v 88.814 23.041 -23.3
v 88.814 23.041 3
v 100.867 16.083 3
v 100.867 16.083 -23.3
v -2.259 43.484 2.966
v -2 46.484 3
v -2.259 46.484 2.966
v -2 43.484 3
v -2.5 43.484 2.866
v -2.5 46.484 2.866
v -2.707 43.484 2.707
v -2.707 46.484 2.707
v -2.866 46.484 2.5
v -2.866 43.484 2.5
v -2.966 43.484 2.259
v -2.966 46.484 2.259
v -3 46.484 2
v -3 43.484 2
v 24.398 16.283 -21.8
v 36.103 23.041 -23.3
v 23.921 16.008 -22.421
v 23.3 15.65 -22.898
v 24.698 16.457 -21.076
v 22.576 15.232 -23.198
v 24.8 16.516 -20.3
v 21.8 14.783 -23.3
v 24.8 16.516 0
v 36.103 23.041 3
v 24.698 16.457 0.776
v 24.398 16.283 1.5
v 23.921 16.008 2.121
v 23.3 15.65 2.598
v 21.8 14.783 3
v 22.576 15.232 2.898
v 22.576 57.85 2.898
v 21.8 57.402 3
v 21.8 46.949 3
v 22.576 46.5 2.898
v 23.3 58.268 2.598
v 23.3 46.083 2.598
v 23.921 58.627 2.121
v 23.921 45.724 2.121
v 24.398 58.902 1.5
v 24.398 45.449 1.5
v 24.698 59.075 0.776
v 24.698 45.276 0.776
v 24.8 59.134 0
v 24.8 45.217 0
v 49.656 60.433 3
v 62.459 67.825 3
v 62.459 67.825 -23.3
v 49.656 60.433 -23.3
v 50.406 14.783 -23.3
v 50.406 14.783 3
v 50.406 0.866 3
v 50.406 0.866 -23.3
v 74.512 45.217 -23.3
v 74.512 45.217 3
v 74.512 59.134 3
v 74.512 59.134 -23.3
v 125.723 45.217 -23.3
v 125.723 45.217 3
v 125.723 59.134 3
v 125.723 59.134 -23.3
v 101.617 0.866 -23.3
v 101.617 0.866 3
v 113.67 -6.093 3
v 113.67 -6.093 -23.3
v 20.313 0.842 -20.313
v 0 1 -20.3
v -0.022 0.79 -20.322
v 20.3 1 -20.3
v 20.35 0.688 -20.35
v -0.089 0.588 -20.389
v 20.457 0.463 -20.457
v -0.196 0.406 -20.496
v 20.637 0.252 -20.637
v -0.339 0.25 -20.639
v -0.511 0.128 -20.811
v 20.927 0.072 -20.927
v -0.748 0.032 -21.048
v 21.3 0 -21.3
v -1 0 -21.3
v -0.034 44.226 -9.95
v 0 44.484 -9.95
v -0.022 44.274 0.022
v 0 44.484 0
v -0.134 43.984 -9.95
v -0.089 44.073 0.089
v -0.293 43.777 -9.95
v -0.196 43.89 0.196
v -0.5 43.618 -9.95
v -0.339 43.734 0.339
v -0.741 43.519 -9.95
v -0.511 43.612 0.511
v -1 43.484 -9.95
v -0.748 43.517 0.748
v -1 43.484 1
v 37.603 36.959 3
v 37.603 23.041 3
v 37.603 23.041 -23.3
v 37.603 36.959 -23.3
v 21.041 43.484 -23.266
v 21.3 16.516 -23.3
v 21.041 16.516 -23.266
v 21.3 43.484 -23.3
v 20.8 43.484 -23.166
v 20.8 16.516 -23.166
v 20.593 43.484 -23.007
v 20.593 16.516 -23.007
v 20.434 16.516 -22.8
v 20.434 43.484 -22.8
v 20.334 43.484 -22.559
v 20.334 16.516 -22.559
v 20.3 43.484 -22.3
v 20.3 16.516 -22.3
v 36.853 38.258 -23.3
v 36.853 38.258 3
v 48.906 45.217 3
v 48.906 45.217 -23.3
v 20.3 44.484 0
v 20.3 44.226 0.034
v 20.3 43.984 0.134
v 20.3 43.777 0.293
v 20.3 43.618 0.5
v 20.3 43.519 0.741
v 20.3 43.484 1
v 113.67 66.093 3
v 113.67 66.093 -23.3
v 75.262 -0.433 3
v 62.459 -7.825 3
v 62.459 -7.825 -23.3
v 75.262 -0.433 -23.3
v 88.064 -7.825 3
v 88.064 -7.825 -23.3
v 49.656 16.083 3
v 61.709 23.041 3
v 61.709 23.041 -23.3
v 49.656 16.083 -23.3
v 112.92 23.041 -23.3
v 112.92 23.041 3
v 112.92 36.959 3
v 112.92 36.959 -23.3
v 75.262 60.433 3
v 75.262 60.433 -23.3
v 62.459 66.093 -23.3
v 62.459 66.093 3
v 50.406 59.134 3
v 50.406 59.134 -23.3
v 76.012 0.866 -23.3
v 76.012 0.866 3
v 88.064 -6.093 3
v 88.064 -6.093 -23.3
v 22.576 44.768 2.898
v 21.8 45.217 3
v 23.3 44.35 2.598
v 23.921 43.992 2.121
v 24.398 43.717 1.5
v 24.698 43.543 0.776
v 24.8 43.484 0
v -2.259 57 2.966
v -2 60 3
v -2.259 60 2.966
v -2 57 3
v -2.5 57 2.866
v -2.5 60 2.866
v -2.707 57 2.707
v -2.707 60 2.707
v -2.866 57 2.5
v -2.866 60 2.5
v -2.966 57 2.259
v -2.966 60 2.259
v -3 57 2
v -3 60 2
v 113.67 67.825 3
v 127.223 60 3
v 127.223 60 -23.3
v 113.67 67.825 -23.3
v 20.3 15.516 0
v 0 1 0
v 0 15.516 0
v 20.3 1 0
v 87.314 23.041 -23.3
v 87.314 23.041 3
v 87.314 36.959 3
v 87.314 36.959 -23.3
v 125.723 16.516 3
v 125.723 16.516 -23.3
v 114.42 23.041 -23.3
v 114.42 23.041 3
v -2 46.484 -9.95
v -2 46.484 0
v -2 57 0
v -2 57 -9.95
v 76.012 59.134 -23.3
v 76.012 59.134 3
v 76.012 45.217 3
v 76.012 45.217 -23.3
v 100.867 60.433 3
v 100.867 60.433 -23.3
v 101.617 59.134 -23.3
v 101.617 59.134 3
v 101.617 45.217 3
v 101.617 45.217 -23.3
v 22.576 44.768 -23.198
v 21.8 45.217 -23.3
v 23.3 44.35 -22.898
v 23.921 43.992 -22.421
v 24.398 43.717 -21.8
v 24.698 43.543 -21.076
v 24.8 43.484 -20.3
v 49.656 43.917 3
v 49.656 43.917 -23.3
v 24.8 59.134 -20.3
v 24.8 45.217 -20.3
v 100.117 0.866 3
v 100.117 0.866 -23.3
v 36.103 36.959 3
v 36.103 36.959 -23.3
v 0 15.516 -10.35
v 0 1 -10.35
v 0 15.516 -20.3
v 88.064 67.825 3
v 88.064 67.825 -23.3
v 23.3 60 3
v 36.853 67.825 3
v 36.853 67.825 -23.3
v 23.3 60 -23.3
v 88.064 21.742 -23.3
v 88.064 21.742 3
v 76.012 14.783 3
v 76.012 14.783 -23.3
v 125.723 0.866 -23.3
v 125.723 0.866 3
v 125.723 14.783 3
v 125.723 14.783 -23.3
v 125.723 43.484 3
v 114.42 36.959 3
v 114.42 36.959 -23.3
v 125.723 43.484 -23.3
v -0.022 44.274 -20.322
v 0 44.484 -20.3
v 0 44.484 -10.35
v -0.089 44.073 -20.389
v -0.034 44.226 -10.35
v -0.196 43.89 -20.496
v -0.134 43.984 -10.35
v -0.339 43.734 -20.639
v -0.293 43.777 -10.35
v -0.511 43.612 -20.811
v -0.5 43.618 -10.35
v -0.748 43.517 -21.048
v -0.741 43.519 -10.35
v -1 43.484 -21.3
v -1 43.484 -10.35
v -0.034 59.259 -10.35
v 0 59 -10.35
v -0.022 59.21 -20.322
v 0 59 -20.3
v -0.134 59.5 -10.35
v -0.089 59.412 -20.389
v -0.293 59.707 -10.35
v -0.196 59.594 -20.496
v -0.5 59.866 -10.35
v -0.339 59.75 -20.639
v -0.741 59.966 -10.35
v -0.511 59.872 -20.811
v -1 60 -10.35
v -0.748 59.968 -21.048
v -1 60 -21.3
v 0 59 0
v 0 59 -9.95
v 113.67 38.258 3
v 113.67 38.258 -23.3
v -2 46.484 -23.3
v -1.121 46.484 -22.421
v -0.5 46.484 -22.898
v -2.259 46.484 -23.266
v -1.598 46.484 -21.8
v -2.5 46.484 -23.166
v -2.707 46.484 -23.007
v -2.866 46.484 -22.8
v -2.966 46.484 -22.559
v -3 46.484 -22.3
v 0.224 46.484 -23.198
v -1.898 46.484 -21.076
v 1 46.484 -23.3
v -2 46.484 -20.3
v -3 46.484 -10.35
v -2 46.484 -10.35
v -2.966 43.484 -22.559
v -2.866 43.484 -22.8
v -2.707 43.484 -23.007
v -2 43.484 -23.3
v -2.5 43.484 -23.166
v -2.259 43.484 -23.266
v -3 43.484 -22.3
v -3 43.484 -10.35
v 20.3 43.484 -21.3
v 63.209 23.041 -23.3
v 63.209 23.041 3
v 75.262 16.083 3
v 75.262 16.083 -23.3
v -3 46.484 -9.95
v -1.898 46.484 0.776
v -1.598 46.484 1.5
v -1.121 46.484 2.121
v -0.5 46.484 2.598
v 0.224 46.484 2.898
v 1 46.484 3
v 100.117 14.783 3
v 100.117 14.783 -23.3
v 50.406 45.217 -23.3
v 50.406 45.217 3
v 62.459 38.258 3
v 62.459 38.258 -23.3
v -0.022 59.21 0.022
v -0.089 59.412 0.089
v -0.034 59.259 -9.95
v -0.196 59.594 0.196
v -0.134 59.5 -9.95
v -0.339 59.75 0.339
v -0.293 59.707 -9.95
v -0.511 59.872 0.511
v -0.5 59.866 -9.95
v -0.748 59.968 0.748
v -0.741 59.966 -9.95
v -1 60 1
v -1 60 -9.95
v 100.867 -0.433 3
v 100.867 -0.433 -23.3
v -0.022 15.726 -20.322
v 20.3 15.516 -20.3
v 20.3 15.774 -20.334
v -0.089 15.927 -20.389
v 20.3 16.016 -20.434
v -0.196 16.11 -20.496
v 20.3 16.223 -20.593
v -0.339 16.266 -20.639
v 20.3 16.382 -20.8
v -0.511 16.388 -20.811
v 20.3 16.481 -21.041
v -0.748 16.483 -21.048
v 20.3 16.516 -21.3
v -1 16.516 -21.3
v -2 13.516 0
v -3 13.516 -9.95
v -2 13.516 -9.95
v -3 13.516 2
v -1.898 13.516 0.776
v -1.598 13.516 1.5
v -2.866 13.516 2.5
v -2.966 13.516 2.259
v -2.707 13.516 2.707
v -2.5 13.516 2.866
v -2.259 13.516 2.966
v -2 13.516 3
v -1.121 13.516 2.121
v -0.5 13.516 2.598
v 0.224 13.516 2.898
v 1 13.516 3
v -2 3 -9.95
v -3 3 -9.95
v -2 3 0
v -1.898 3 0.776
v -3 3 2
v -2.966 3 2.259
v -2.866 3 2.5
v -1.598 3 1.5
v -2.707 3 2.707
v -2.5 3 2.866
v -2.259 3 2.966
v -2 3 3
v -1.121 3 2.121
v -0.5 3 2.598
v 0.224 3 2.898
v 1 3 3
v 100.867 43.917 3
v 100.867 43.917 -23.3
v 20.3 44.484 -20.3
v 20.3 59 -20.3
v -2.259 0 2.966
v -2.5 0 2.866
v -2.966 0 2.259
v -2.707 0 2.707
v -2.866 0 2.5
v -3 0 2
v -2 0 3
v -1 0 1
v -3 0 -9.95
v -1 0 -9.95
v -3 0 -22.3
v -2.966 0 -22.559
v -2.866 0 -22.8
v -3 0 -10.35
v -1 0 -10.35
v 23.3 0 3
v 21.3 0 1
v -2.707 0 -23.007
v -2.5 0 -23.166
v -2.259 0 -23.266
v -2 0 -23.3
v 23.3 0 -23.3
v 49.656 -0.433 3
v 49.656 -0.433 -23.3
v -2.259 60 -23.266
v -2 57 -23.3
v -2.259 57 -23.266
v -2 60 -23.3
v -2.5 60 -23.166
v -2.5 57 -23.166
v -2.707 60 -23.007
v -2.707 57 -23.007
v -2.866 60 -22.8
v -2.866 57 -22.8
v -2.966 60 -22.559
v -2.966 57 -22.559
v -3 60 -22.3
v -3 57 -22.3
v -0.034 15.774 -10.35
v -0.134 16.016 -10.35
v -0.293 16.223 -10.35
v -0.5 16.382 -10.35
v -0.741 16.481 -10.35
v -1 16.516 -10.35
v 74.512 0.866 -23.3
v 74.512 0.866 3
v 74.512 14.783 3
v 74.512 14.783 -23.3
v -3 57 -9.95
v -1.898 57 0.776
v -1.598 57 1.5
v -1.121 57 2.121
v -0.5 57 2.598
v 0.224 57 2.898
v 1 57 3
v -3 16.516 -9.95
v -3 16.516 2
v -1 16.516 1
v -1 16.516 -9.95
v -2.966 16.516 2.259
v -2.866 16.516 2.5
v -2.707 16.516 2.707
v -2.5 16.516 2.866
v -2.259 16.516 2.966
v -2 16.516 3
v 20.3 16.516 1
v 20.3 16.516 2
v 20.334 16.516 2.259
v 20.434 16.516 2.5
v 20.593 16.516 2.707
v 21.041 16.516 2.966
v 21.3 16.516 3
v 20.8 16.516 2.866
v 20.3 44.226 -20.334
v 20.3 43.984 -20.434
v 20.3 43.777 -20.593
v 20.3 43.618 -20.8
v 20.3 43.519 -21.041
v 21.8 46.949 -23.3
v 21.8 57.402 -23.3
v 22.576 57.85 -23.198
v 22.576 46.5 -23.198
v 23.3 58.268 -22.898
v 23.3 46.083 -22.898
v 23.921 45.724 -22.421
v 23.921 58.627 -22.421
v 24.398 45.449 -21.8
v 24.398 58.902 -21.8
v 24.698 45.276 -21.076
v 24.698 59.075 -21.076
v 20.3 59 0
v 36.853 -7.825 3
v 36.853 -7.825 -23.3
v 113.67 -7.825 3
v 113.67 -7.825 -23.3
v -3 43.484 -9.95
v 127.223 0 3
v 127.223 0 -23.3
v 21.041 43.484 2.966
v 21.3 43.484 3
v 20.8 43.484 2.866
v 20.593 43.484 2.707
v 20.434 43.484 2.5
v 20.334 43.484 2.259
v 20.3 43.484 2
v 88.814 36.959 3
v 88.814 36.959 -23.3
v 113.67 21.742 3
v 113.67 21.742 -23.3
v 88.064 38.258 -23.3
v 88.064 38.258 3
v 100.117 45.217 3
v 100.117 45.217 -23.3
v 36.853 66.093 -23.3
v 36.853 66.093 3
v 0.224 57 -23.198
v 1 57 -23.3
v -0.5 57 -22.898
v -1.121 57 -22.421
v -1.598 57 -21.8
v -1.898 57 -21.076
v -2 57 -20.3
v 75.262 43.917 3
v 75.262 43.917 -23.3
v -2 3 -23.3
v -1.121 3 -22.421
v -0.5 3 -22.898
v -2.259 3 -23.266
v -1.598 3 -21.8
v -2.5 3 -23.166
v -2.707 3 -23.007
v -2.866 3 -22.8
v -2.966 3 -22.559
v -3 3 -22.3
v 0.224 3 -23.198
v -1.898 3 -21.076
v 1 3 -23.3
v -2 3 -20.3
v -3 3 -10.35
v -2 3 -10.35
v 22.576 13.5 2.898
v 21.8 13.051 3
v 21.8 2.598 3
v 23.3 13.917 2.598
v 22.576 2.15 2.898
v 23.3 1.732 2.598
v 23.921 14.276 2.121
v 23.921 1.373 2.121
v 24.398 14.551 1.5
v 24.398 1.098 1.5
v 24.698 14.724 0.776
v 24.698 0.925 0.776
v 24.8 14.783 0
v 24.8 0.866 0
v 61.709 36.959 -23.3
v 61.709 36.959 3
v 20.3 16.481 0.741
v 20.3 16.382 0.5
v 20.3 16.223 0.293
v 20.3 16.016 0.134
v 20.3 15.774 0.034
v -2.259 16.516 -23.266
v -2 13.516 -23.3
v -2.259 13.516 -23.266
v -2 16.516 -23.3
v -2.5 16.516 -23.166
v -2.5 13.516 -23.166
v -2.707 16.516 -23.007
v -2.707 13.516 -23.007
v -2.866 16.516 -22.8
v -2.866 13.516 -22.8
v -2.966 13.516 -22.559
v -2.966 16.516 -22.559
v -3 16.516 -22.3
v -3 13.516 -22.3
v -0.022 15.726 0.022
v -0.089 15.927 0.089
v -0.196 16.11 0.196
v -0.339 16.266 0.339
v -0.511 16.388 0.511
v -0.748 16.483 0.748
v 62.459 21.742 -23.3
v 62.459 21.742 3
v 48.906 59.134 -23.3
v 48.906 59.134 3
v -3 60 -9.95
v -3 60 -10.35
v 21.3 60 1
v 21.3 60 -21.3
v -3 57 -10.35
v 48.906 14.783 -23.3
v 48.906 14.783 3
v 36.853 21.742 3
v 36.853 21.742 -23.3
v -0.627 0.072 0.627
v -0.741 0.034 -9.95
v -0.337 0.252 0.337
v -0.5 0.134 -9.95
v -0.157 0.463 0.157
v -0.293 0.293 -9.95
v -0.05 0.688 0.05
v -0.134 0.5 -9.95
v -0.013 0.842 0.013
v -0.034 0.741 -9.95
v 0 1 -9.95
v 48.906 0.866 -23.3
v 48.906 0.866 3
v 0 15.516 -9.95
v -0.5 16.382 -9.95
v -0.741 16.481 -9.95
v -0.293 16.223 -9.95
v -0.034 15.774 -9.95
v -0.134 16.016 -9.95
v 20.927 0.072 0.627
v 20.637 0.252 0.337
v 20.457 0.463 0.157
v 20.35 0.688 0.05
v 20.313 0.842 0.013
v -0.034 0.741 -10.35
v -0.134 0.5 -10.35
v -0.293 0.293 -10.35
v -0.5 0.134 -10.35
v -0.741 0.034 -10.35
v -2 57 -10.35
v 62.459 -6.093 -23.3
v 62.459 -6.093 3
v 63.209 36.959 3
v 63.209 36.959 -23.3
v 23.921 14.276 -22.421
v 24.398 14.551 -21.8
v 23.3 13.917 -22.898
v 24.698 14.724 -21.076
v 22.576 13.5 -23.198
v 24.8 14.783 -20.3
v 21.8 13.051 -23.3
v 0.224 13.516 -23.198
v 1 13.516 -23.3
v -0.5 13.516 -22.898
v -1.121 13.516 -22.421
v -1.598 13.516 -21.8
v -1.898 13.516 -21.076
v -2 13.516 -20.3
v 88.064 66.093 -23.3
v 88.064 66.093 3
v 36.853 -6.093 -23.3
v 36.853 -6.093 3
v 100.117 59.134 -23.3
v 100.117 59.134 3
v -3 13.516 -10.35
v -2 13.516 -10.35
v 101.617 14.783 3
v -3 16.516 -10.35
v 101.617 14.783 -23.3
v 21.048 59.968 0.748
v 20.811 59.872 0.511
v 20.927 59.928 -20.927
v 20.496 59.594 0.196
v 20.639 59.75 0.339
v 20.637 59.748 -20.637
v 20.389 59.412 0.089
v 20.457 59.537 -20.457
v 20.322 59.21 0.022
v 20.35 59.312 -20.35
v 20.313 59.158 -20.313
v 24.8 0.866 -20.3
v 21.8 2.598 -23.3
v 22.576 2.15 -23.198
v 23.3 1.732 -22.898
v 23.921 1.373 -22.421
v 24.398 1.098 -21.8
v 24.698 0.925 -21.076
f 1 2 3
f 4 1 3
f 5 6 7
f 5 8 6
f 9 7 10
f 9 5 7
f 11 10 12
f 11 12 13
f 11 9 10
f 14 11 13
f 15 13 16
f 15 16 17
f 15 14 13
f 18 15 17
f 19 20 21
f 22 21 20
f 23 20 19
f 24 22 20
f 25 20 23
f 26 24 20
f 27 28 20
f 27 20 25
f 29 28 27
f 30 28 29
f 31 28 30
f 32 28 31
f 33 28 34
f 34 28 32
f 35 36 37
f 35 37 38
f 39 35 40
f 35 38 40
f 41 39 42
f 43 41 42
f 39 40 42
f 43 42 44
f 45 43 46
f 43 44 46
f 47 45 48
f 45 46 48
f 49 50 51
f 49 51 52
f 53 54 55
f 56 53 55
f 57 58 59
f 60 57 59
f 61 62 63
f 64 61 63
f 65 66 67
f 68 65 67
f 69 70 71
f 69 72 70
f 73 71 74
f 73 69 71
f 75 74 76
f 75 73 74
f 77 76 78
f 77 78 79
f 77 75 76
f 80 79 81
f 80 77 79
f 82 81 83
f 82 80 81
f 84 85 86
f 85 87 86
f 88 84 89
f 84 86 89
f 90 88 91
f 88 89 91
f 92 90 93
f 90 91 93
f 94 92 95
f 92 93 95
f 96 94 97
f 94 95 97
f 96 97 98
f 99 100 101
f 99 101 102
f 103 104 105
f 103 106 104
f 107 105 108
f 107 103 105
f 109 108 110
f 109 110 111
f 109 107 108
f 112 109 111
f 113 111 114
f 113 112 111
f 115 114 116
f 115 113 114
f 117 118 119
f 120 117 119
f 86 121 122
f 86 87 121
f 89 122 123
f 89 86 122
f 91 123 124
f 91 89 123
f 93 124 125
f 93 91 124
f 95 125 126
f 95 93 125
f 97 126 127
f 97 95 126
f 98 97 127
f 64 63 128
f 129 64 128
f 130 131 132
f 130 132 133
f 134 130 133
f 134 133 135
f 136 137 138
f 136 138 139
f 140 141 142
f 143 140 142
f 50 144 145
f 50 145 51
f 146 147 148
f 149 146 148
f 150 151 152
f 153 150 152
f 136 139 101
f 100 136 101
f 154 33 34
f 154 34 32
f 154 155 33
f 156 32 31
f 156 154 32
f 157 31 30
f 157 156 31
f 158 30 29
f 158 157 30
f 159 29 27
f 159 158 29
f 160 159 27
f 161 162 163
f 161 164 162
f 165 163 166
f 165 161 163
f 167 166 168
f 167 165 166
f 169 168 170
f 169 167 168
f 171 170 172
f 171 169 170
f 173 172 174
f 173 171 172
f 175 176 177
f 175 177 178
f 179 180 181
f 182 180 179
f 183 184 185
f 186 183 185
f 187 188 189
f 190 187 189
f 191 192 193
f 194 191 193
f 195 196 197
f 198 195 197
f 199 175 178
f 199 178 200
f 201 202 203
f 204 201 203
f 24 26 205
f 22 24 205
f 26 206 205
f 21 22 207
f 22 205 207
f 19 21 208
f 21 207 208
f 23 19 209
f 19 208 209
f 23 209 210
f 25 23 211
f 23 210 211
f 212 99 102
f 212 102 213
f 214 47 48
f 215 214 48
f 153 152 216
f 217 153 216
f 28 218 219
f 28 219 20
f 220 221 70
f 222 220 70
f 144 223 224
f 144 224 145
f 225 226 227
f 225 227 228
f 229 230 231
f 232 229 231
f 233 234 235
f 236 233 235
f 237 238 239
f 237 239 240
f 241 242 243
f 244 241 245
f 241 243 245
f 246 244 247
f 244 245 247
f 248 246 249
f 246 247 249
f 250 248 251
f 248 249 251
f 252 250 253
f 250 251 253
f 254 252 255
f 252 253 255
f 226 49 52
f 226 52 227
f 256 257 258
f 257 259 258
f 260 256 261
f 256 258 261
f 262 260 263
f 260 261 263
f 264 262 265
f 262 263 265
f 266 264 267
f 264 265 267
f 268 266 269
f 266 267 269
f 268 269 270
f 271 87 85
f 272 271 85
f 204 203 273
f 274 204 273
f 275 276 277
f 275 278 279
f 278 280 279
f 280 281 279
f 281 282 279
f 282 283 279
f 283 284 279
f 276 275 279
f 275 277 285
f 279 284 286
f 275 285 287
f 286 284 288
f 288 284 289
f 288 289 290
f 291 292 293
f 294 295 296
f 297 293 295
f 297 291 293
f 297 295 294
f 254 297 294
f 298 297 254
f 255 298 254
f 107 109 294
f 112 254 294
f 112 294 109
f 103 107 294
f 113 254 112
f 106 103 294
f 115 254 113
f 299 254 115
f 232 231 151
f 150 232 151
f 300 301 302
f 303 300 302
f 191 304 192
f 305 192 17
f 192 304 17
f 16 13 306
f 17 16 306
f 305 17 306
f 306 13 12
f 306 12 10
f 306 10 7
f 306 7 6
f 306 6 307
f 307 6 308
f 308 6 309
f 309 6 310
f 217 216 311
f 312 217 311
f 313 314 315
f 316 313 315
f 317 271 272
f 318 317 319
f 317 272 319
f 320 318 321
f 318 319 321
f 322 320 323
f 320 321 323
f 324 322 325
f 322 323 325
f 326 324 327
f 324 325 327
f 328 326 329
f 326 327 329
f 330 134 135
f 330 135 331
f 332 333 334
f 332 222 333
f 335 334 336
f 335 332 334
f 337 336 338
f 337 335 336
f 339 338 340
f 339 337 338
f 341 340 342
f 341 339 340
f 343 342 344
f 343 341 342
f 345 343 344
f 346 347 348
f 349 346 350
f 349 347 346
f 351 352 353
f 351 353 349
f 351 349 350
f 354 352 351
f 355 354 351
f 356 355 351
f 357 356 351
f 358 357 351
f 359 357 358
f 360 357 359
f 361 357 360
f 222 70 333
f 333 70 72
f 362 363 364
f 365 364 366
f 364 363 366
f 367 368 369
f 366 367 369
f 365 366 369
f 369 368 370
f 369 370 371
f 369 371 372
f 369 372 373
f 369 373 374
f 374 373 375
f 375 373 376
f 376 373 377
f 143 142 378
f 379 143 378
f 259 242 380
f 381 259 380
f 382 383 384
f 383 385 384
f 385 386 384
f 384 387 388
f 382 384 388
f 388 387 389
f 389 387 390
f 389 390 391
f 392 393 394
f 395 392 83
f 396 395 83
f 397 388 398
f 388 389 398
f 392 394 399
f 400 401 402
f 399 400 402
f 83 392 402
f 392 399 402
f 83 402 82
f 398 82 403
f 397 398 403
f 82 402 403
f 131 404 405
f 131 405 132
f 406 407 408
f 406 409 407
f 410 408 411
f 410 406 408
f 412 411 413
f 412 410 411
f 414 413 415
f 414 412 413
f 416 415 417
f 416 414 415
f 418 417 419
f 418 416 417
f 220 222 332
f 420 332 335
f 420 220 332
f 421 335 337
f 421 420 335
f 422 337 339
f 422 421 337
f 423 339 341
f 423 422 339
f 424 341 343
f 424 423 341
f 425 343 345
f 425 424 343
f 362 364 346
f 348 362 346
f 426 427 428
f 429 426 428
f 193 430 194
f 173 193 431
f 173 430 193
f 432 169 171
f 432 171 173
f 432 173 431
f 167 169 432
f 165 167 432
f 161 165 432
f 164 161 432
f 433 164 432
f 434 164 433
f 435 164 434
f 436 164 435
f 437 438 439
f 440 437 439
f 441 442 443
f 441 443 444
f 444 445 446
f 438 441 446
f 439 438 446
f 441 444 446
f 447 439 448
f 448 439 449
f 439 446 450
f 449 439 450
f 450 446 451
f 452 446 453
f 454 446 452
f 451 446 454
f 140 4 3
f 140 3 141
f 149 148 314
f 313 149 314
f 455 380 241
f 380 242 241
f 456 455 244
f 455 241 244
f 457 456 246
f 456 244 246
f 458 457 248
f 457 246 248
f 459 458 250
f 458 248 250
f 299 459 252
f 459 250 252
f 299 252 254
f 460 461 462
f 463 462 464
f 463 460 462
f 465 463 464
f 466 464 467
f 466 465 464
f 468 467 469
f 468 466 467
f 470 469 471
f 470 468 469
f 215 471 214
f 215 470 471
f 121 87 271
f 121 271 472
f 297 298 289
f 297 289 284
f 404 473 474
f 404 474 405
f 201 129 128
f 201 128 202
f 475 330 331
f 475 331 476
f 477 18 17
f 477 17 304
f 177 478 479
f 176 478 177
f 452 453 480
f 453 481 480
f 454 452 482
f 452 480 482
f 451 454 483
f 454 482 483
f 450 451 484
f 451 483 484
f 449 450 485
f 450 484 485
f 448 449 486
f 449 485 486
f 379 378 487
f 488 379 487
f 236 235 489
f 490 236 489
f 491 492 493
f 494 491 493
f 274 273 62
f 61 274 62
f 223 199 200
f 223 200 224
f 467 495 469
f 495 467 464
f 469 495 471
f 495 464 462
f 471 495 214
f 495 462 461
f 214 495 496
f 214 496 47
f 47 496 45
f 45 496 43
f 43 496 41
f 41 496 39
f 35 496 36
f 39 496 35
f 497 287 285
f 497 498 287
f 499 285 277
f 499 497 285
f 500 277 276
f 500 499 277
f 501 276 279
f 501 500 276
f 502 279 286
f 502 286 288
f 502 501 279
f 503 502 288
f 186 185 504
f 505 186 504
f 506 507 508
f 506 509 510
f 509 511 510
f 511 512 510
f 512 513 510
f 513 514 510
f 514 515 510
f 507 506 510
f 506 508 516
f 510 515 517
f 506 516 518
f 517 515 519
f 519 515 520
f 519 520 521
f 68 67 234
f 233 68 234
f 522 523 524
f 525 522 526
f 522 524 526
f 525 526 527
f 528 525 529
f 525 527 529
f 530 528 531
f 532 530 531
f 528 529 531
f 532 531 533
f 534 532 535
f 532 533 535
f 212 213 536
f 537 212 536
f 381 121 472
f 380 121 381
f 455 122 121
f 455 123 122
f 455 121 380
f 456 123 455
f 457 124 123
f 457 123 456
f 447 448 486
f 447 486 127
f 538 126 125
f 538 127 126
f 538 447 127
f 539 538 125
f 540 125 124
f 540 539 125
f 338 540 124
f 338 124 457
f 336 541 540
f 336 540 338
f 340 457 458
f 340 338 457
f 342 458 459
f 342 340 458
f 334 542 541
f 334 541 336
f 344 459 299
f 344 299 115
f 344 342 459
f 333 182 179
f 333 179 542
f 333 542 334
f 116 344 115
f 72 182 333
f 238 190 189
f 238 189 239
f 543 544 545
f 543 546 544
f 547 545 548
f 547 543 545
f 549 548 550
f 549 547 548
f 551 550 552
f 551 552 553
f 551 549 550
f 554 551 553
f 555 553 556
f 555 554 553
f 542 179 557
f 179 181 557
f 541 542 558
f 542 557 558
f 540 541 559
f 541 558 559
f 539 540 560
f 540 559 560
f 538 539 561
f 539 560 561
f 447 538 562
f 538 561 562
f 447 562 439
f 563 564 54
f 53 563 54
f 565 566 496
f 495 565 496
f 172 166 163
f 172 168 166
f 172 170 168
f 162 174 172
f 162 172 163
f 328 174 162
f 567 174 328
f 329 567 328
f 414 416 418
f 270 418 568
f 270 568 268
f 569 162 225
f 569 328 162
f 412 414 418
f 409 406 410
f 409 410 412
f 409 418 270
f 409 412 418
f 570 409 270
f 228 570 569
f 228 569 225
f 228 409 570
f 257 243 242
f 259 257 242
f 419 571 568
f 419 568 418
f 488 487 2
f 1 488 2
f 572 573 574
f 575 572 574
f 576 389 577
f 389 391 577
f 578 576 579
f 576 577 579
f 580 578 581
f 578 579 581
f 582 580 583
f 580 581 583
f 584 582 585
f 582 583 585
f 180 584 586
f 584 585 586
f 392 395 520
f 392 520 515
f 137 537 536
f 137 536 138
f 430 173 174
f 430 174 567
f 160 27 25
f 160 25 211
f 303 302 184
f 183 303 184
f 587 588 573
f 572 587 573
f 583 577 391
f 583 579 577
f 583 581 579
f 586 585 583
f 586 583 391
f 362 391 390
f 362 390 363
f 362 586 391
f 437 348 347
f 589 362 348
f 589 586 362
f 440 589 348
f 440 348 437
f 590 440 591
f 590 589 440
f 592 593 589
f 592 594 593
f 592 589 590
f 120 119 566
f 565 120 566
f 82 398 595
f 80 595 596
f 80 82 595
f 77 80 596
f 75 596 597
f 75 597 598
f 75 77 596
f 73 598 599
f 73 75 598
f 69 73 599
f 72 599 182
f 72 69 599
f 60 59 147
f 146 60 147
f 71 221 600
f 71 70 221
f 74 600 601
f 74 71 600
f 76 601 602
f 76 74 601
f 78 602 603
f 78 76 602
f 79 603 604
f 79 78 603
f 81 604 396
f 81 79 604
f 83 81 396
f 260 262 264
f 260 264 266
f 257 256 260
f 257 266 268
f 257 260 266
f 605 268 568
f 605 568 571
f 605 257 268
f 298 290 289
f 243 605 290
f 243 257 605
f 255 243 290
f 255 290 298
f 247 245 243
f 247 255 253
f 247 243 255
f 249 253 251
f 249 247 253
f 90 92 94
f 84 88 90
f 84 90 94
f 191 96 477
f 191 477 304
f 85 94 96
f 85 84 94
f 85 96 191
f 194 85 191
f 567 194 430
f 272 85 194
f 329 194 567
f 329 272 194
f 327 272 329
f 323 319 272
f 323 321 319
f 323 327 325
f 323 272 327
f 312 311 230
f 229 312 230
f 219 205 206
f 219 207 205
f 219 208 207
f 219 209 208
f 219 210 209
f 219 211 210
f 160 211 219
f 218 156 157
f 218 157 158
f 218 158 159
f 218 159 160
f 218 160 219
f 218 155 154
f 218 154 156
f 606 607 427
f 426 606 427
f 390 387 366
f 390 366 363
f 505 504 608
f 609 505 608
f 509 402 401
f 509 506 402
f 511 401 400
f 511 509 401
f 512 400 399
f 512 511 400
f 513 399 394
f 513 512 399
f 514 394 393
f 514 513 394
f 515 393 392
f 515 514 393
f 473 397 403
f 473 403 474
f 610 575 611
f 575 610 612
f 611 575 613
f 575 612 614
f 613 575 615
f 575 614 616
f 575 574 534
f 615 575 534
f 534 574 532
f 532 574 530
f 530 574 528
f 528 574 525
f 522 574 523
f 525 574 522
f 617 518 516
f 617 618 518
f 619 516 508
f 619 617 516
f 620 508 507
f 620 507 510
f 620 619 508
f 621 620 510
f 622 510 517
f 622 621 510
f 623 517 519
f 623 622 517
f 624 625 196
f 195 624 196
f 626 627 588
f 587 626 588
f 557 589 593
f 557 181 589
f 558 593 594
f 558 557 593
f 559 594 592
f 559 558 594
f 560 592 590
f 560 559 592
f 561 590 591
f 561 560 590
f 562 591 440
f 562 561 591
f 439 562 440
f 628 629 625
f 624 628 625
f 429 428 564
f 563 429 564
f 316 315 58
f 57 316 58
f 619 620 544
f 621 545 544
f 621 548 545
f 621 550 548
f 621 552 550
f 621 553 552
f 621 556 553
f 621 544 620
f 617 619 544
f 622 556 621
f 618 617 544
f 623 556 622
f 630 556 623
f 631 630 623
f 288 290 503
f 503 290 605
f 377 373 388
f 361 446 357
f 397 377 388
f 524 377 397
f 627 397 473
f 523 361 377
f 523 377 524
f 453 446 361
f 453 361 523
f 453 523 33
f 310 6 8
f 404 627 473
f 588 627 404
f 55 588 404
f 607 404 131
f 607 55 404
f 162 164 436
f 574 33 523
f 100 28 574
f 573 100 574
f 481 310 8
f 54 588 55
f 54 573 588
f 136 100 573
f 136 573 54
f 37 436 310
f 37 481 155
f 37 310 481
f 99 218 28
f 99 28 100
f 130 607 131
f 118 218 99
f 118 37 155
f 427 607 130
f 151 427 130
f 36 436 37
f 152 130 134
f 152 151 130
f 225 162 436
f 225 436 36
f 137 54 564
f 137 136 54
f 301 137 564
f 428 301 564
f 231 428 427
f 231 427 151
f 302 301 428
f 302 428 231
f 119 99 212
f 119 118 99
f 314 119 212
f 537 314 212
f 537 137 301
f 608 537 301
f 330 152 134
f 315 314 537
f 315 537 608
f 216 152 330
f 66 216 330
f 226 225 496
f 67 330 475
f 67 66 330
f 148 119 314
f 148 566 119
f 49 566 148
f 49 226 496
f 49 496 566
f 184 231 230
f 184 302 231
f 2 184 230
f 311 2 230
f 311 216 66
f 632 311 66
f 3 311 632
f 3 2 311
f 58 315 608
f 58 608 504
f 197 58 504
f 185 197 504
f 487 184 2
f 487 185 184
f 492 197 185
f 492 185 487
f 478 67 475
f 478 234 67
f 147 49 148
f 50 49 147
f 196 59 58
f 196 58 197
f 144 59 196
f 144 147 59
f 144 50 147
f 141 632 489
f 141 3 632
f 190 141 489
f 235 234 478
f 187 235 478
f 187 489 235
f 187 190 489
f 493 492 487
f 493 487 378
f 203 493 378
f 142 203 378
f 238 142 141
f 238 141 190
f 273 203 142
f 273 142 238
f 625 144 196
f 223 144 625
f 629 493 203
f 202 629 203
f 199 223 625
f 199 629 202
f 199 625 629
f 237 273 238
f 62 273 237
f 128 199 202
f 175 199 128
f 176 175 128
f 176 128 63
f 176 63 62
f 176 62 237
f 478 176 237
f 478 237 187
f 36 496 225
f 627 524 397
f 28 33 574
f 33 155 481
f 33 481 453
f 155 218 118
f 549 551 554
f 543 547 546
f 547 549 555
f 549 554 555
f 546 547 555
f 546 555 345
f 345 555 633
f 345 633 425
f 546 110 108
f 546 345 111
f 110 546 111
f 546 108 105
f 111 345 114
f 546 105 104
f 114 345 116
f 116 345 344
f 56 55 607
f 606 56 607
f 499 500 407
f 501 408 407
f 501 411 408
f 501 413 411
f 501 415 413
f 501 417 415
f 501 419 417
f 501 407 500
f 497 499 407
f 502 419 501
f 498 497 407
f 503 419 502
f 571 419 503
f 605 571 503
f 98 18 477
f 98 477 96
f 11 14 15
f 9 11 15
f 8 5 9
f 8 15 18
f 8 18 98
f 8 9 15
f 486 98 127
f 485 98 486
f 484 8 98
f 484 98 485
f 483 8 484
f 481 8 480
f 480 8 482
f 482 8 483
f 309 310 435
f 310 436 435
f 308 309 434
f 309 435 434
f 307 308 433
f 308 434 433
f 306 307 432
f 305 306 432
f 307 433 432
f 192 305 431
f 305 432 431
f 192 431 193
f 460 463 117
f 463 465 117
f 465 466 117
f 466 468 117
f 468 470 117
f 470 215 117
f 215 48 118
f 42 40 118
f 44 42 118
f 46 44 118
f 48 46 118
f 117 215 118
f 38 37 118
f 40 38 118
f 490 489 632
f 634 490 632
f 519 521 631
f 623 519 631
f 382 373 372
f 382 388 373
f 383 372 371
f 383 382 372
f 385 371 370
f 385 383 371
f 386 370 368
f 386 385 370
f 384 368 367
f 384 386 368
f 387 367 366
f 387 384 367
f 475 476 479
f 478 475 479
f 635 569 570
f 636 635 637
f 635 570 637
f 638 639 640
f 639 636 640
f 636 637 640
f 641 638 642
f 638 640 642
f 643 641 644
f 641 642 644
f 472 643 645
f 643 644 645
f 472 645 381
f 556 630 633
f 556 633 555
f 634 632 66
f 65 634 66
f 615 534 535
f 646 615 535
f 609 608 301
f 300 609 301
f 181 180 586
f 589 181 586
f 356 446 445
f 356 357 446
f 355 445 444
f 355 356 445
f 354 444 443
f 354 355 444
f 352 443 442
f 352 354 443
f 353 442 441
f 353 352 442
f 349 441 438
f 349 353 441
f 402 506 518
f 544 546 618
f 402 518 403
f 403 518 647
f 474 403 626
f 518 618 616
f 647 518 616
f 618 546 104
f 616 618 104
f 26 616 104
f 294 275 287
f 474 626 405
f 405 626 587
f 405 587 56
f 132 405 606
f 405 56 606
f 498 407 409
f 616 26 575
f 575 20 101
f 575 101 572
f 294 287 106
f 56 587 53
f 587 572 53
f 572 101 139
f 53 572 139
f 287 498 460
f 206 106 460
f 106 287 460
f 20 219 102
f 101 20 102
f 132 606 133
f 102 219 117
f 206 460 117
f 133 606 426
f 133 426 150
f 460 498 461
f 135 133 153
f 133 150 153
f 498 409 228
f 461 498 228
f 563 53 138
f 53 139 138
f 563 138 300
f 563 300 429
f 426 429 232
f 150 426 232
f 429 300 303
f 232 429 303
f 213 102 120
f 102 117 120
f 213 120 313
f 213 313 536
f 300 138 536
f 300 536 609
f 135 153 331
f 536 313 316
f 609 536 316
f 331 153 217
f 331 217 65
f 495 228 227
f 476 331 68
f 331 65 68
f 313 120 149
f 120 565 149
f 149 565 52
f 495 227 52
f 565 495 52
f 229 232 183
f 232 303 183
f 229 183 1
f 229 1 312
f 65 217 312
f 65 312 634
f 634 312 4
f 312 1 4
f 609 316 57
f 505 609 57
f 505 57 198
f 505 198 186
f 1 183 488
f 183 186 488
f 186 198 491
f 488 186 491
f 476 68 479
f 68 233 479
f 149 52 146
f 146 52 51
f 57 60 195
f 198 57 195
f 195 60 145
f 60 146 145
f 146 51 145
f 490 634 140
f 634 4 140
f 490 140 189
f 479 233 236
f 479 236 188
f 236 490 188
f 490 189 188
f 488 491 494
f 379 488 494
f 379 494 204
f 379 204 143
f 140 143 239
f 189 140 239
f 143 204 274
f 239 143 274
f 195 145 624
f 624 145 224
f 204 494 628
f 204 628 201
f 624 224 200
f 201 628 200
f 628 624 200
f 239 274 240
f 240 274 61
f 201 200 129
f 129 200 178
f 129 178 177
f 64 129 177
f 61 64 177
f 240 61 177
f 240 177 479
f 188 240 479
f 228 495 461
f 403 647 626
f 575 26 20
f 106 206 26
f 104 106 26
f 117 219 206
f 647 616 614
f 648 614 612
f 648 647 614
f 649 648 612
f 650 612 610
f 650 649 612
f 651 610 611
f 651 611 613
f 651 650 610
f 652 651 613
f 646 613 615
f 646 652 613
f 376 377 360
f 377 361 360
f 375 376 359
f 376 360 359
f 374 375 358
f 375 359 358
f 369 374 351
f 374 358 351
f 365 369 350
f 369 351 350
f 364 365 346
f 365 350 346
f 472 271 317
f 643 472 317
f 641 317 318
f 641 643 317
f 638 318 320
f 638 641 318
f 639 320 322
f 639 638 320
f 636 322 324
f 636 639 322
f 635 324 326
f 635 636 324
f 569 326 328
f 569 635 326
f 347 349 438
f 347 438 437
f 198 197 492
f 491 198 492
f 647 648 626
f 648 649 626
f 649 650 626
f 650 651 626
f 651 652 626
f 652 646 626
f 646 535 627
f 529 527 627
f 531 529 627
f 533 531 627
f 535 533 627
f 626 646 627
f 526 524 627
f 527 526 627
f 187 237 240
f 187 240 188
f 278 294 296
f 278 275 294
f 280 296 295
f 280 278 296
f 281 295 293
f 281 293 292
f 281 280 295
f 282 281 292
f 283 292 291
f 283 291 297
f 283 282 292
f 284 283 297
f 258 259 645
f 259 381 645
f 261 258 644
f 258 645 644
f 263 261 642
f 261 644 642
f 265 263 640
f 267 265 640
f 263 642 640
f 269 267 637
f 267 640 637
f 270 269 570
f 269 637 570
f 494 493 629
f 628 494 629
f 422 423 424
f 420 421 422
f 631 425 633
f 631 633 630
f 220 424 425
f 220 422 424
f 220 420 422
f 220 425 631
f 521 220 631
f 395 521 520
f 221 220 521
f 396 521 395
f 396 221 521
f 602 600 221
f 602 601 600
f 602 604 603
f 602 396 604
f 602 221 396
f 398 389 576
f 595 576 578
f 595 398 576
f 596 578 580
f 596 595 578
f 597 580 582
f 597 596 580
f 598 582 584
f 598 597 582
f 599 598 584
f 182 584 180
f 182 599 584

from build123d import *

# Parameters (mm, degrees)
SKETCH1_W                  = 26.3
SKETCH1_H                  = 26.3
SKETCH1_W_2                = 20.3
SKETCH1_H_2                = 20.3
TUBE_EXTRUDE_DEPTH         = 60
HEX_EXTRUDE_DEPTH          = 26.3
SKETCH3_W                  = 23.3
SKETCH3_H                  = 26.968911086
TUBE_CENTER_CUT_DEPTH      = 1
TUBE_CENTER_CUT_DEPTH_BACK = 27.3
CUT_EXTRUDE1_START         = -3
CUT_EXTRUDE1_DEPTH         = 3
SKETCH5_W                  = 1
SKETCH5_H                  = 10.515544457
CUT_EXTRUDE2_DEPTH         = 27.3
FILLET1_R                  = 3
FILLET2_R                  = 1


with BuildPart() as part:
    # Sketch1 → Tube Extrude (new body)
    with BuildSketch(Plane(origin=(0, 0, 0), x_dir=(1, 0, 0), z_dir=(0, 1, 0))):
        with Locations((10.15, 10.15)):
            Rectangle(SKETCH1_W, SKETCH1_H)
        with Locations((10.15, 10.15)):
            Rectangle(SKETCH1_W_2, SKETCH1_H_2, mode=Mode.SUBTRACT)
    extrude(amount=TUBE_EXTRUDE_DEPTH)

    # Sketch2 → Hex Extrude (add)
    with BuildSketch(Plane.XY.offset(3)):
        Polygon((23.3, 15.649519053), (23.3, 0), (36.852881057, -7.824759526), (49.655762114, -0.433012702), (62.45864317, -7.824759526), (75.261524227, -0.433012702), (88.064405284, -7.824759526), (100.867286341, -0.433012702), (113.670167397, -7.824759526), (127.223048454, 0), (127.223048454, 15.649519053), (127.223048454, 44.350480947), (127.223048454, 60), (113.670167397, 67.824759526), (100.867286341, 60.433012702), (88.064405284, 67.824759526), (75.261524227, 60.433012702), (62.45864317, 67.824759526), (49.655762114, 60.433012702), (36.852881057, 67.824759526), (23.3, 60), (23.3, 44.350480947), align=None)
        Polygon((49.655762114, 16.082531755), (37.602881057, 23.041265877), (37.602881057, 36.958734123), (49.655762114, 43.917468245), (61.70864317, 36.958734123), (61.70864317, 23.041265877), align=None, mode=Mode.SUBTRACT)
        Polygon((36.102881057, 23.041265877), (24.8, 16.515544457), (24.8, 43.484455543), (36.102881057, 36.958734123), align=None, mode=Mode.SUBTRACT)
        Polygon((24.8, 0.866025404), (36.852881057, -6.092708719), (48.905762114, 0.866025404), (48.905762114, 14.783493649), (36.852881057, 21.742227772), (24.8, 14.783493649), align=None, mode=Mode.SUBTRACT)
        Polygon((50.405762114, 0.866025404), (62.45864317, -6.092708719), (74.511524227, 0.866025404), (74.511524227, 14.783493649), (62.45864317, 21.742227772), (50.405762114, 14.783493649), align=None, mode=Mode.SUBTRACT)
        Polygon((76.011524227, 0.866025404), (88.064405284, -6.092708719), (100.117286341, 0.866025404), (100.117286341, 14.783493649), (88.064405284, 21.742227772), (76.011524227, 14.783493649), align=None, mode=Mode.SUBTRACT)
        Polygon((125.723048454, 16.515544457), (114.420167397, 23.041265877), (114.420167397, 36.958734123), (125.723048454, 43.484455543), align=None, mode=Mode.SUBTRACT)
        Polygon((101.617286341, 0.866025404), (113.670167397, -6.092708719), (125.723048454, 0.866025404), (125.723048454, 14.783493649), (113.670167397, 21.742227772), (101.617286341, 14.783493649), align=None, mode=Mode.SUBTRACT)
        Polygon((24.8, 45.216506351), (36.852881057, 38.257772228), (48.905762114, 45.216506351), (48.905762114, 59.133974596), (36.852881057, 66.092708719), (24.8, 59.133974596), align=None, mode=Mode.SUBTRACT)
        Polygon((50.405762114, 45.216506351), (62.45864317, 38.257772228), (74.511524227, 45.216506351), (74.511524227, 59.133974596), (62.45864317, 66.092708719), (50.405762114, 59.133974596), align=None, mode=Mode.SUBTRACT)
        Polygon((76.011524227, 45.216506351), (88.064405284, 38.257772228), (100.117286341, 45.216506351), (100.117286341, 59.133974596), (88.064405284, 66.092708719), (76.011524227, 59.133974596), align=None, mode=Mode.SUBTRACT)
        Polygon((101.617286341, 45.216506351), (113.670167397, 38.257772228), (125.723048454, 45.216506351), (125.723048454, 59.133974596), (113.670167397, 66.092708719), (101.617286341, 59.133974596), align=None, mode=Mode.SUBTRACT)
        Polygon((75.261524227, 16.082531755), (87.314405284, 23.041265877), (87.314405284, 36.958734123), (75.261524227, 43.917468245), (63.20864317, 36.958734123), (63.20864317, 23.041265877), align=None, mode=Mode.SUBTRACT)
        Polygon((100.867286341, 16.082531755), (112.920167397, 23.041265877), (112.920167397, 36.958734123), (100.867286341, 43.917468245), (88.814405284, 36.958734123), (88.814405284, 23.041265877), align=None, mode=Mode.SUBTRACT)
    extrude(amount=-HEX_EXTRUDE_DEPTH)

    # Sketch3 → Tube Center Cut (cut, two sides)
    with BuildSketch(Plane.XY.offset(3)) as tube_center_cut_sk:
        with Locations((8.65, 30)):
            Rectangle(SKETCH3_W, SKETCH3_H)
    extrude(amount=TUBE_CENTER_CUT_DEPTH, mode=Mode.SUBTRACT)
    extrude(tube_center_cut_sk.sketch, amount=-TUBE_CENTER_CUT_DEPTH_BACK, mode=Mode.SUBTRACT)

    # Sketch4 → Cut-Extrude1 (cut)
    with BuildSketch(Plane.ZY.offset(3).offset(CUT_EXTRUDE1_START)):
        Polygon((-10.15, 60), (-10.35, 60), (-10.35, 0), (-10.15, 0), (-9.95, 0), (-9.95, 60), align=None)
    extrude(amount=CUT_EXTRUDE1_DEPTH, mode=Mode.SUBTRACT)

    # Sketch5 → Cut-Extrude2 (cut, through all)
    with BuildSketch(Plane.XY.offset(3)):
        with Locations((-2.5, 51.742227771)):
            Rectangle(SKETCH5_W, SKETCH5_H)
        with Locations((-2.5, 8.257772229)):
            Rectangle(SKETCH5_W, SKETCH5_H)
    extrude(amount=-CUT_EXTRUDE2_DEPTH, mode=Mode.SUBTRACT)

    # Fillet1
    fillet1_edges = [part.edges().sort_by_distance(p)[0] for p in [
        (-2, 51.742227772, -23.3),
        (-2, 51.742227772, 3),
        (-2, 8.257772228, -23.3),
        (-2, 8.257772228, 3),
        (24.8, 52.175240474, -23.3),
        (24.8, 52.175240474, 3),
        (24.8, 7.824759526, -23.3),
        (24.8, 7.824759526, 3),
        (24.8, 30, 3),
        (24.8, 30, -23.3),
    ]]
    fillet(fillet1_edges, radius=FILLET1_R)

    # Fillet2
    fillet2_edges = [part.edges().sort_by_distance(p)[0] for p in [
        (0, 0, -15.325),
        (10.15, 0, 0),
        (20.3, 0, -10.15),
        (10.15, 0, -20.3),
        (0, 60, -15.325),
        (10.15, 60, 0),
        (20.3, 60, -10.15),
        (10.15, 60, -20.3),
        (10.15, 43.484455543, -20.3),
        (10.15, 16.515544457, -20.3),
        (-3, 15.015544457, -23.3),
        (-3, 15.015544457, 3),
        (20.3, 30, 3),
        (10.15, 16.515544457, 0),
        (0, 16.515544457, -4.975),
        (0, 43.484455543, -15.325),
        (10.15, 43.484455543, 0),
        (20.3, 30, -23.3),
        (0, 43.484455543, -4.975),
        (0, 16.515544457, -15.325),
        (0, 60, -4.975),
        (0, 0, -4.975),
        (-3, 1.5, -23.3),
        (-3, 44.984455543, -23.3),
        (-3, 1.5, 3),
        (-3, 44.984455543, 3),
        (-3, 58.5, -23.3),
        (-3, 58.5, 3),
    ]]
    fillet(fillet2_edges, radius=FILLET2_R)


solid = part.part
